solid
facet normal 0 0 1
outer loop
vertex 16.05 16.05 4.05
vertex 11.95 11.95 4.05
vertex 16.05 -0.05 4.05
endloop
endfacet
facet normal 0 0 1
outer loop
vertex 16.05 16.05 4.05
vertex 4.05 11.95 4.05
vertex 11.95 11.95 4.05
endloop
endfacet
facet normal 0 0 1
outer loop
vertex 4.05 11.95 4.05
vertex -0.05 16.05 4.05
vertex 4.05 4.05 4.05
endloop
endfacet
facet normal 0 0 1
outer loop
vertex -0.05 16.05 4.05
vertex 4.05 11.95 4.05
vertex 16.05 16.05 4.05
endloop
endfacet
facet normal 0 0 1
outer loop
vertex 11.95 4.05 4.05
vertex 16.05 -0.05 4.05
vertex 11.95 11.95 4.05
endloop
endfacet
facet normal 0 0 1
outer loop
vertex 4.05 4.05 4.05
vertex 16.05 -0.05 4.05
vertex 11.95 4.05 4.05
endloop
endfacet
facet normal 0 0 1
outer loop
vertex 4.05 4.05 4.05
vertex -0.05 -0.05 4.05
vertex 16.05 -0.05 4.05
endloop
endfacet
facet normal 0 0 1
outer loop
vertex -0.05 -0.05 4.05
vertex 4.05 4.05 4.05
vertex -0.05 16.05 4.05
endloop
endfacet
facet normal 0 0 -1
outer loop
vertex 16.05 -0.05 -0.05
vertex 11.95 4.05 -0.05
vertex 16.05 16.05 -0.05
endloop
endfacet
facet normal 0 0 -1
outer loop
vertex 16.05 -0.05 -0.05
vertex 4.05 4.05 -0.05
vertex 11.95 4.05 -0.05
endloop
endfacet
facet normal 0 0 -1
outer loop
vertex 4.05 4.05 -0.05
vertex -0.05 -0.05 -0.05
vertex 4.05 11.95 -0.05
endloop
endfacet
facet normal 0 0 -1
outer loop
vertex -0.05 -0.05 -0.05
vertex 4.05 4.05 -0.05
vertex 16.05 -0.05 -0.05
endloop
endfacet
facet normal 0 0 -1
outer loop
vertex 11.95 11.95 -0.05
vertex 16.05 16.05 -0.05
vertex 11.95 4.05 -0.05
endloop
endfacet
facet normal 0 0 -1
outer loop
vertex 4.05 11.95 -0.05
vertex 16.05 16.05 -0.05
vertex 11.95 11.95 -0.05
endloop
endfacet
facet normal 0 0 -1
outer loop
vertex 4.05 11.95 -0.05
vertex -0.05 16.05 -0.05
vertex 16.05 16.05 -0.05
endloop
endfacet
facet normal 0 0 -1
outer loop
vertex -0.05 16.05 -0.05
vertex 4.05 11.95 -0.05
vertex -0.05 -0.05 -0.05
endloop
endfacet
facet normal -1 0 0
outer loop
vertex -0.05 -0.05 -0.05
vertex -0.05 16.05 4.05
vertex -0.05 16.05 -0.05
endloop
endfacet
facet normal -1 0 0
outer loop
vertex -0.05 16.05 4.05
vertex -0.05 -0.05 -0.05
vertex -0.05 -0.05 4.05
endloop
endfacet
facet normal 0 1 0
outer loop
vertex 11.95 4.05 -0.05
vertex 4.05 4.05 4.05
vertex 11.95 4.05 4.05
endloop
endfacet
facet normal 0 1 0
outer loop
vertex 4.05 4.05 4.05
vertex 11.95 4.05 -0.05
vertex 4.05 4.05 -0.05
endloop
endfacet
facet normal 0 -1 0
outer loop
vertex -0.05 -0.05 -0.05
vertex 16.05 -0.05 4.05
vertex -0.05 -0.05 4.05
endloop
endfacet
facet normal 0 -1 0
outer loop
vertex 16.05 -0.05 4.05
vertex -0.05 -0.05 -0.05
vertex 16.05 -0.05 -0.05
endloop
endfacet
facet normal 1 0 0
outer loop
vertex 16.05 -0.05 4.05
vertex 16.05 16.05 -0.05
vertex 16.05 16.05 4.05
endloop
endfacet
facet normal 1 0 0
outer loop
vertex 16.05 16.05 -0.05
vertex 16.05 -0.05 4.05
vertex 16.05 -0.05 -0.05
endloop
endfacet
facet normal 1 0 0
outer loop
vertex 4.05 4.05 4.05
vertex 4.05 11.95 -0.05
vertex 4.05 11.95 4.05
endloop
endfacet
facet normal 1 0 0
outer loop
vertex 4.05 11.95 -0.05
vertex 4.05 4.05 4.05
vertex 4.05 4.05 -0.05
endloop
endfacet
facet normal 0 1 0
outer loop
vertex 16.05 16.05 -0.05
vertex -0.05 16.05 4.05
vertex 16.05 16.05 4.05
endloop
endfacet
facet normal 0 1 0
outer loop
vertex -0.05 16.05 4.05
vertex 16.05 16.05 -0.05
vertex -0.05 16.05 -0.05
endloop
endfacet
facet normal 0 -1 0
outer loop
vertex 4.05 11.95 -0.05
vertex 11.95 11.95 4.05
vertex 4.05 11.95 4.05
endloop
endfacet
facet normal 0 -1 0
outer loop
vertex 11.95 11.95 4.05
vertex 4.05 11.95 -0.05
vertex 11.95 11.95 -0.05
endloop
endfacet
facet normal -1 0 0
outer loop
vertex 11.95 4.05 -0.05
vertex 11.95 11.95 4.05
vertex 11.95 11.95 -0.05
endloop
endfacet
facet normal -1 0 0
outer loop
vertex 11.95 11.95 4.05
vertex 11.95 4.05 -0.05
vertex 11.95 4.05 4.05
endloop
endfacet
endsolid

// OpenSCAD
//Block
//Version 2.0
//Licence: CC-0
//Author: Remi Sarrailh <remi@madnerd.org>
$fn = 30;
module block(z=2){
    cube([4,4,z]);
}

module block_espacios(x=4,y=4,z=2){
    x = x-1;
    y = y-1;
    z= z+0.05;
    
    for(a=[0:x])
        translate([-0.05,-0.05,0]) //Margin for difference
        translate([4*a,0,-0.05])
        cube(4.1,4.1,z=z);
    if(y >= 1){
        for(a=[1:y]) 
            translate([-0.05,-0.05,0]) //Margin for difference
            translate([0,4*a,-0.05]) 
            cube(4.1,4.1,z=z);
    }
    if(x >= 1){
        for(a=[1:x]) 
            translate([-0.05,-0.05,0]) //Margin for difference
            translate([4*a,4*y,-0.05]) 
            cube(4.1,4.1,z=z);
    }
    if(y >=2){
        for(a=[1:y-1]) 
            translate([-0.05,-0.05,0]) //Margin for difference
            translate([4*x,4*a,-0.05])
            cube(4.1,4.1,z=z);
    }
}

module block_panelas(x=4,y=4,z=2){
    translate([-0.05,-0.05,-0.05]) cube([x*4+0.1,y*4+0.1,z+0.1]);
}

module blocks(x=4,y=4,z=2,fillet=false){
    if(fillet){
        difference(){
            cube([x*4,y*4,z]);
            fillet();
            fillet(x=(x*4-1),z=z,rotation=90);
            fillet(y=(y*4-1),z=z,rotation=270);
            fillet(x=(x*4-1),y=(y*4-1),z=z,rotation=180);
        }
    }else{     
        cube([x*4,y*4,z]);
    }
}

//Rounded corner
//http://forum.openscad.org/rounded-corners-td3843.html
module fillet(r=1, z=2,rotation=0, x=0, y=0) {
    translate([r / 2 + x, r / 2 + y, 0]) 
    rotate(rotation,0,0)
        difference() {
            cube([r + 0.01, r + 0.01, z*2 +1], center = true);

            translate([r/2, r/2, 0])
                cylinder(r = r, h = z*2 +1, center = true);

        }
}

//block_panelas(x=4,y=4,z=2);
block_espacios(x=4,y=4,z=2);


//color("red") block_panelas();
//block_espacios();
